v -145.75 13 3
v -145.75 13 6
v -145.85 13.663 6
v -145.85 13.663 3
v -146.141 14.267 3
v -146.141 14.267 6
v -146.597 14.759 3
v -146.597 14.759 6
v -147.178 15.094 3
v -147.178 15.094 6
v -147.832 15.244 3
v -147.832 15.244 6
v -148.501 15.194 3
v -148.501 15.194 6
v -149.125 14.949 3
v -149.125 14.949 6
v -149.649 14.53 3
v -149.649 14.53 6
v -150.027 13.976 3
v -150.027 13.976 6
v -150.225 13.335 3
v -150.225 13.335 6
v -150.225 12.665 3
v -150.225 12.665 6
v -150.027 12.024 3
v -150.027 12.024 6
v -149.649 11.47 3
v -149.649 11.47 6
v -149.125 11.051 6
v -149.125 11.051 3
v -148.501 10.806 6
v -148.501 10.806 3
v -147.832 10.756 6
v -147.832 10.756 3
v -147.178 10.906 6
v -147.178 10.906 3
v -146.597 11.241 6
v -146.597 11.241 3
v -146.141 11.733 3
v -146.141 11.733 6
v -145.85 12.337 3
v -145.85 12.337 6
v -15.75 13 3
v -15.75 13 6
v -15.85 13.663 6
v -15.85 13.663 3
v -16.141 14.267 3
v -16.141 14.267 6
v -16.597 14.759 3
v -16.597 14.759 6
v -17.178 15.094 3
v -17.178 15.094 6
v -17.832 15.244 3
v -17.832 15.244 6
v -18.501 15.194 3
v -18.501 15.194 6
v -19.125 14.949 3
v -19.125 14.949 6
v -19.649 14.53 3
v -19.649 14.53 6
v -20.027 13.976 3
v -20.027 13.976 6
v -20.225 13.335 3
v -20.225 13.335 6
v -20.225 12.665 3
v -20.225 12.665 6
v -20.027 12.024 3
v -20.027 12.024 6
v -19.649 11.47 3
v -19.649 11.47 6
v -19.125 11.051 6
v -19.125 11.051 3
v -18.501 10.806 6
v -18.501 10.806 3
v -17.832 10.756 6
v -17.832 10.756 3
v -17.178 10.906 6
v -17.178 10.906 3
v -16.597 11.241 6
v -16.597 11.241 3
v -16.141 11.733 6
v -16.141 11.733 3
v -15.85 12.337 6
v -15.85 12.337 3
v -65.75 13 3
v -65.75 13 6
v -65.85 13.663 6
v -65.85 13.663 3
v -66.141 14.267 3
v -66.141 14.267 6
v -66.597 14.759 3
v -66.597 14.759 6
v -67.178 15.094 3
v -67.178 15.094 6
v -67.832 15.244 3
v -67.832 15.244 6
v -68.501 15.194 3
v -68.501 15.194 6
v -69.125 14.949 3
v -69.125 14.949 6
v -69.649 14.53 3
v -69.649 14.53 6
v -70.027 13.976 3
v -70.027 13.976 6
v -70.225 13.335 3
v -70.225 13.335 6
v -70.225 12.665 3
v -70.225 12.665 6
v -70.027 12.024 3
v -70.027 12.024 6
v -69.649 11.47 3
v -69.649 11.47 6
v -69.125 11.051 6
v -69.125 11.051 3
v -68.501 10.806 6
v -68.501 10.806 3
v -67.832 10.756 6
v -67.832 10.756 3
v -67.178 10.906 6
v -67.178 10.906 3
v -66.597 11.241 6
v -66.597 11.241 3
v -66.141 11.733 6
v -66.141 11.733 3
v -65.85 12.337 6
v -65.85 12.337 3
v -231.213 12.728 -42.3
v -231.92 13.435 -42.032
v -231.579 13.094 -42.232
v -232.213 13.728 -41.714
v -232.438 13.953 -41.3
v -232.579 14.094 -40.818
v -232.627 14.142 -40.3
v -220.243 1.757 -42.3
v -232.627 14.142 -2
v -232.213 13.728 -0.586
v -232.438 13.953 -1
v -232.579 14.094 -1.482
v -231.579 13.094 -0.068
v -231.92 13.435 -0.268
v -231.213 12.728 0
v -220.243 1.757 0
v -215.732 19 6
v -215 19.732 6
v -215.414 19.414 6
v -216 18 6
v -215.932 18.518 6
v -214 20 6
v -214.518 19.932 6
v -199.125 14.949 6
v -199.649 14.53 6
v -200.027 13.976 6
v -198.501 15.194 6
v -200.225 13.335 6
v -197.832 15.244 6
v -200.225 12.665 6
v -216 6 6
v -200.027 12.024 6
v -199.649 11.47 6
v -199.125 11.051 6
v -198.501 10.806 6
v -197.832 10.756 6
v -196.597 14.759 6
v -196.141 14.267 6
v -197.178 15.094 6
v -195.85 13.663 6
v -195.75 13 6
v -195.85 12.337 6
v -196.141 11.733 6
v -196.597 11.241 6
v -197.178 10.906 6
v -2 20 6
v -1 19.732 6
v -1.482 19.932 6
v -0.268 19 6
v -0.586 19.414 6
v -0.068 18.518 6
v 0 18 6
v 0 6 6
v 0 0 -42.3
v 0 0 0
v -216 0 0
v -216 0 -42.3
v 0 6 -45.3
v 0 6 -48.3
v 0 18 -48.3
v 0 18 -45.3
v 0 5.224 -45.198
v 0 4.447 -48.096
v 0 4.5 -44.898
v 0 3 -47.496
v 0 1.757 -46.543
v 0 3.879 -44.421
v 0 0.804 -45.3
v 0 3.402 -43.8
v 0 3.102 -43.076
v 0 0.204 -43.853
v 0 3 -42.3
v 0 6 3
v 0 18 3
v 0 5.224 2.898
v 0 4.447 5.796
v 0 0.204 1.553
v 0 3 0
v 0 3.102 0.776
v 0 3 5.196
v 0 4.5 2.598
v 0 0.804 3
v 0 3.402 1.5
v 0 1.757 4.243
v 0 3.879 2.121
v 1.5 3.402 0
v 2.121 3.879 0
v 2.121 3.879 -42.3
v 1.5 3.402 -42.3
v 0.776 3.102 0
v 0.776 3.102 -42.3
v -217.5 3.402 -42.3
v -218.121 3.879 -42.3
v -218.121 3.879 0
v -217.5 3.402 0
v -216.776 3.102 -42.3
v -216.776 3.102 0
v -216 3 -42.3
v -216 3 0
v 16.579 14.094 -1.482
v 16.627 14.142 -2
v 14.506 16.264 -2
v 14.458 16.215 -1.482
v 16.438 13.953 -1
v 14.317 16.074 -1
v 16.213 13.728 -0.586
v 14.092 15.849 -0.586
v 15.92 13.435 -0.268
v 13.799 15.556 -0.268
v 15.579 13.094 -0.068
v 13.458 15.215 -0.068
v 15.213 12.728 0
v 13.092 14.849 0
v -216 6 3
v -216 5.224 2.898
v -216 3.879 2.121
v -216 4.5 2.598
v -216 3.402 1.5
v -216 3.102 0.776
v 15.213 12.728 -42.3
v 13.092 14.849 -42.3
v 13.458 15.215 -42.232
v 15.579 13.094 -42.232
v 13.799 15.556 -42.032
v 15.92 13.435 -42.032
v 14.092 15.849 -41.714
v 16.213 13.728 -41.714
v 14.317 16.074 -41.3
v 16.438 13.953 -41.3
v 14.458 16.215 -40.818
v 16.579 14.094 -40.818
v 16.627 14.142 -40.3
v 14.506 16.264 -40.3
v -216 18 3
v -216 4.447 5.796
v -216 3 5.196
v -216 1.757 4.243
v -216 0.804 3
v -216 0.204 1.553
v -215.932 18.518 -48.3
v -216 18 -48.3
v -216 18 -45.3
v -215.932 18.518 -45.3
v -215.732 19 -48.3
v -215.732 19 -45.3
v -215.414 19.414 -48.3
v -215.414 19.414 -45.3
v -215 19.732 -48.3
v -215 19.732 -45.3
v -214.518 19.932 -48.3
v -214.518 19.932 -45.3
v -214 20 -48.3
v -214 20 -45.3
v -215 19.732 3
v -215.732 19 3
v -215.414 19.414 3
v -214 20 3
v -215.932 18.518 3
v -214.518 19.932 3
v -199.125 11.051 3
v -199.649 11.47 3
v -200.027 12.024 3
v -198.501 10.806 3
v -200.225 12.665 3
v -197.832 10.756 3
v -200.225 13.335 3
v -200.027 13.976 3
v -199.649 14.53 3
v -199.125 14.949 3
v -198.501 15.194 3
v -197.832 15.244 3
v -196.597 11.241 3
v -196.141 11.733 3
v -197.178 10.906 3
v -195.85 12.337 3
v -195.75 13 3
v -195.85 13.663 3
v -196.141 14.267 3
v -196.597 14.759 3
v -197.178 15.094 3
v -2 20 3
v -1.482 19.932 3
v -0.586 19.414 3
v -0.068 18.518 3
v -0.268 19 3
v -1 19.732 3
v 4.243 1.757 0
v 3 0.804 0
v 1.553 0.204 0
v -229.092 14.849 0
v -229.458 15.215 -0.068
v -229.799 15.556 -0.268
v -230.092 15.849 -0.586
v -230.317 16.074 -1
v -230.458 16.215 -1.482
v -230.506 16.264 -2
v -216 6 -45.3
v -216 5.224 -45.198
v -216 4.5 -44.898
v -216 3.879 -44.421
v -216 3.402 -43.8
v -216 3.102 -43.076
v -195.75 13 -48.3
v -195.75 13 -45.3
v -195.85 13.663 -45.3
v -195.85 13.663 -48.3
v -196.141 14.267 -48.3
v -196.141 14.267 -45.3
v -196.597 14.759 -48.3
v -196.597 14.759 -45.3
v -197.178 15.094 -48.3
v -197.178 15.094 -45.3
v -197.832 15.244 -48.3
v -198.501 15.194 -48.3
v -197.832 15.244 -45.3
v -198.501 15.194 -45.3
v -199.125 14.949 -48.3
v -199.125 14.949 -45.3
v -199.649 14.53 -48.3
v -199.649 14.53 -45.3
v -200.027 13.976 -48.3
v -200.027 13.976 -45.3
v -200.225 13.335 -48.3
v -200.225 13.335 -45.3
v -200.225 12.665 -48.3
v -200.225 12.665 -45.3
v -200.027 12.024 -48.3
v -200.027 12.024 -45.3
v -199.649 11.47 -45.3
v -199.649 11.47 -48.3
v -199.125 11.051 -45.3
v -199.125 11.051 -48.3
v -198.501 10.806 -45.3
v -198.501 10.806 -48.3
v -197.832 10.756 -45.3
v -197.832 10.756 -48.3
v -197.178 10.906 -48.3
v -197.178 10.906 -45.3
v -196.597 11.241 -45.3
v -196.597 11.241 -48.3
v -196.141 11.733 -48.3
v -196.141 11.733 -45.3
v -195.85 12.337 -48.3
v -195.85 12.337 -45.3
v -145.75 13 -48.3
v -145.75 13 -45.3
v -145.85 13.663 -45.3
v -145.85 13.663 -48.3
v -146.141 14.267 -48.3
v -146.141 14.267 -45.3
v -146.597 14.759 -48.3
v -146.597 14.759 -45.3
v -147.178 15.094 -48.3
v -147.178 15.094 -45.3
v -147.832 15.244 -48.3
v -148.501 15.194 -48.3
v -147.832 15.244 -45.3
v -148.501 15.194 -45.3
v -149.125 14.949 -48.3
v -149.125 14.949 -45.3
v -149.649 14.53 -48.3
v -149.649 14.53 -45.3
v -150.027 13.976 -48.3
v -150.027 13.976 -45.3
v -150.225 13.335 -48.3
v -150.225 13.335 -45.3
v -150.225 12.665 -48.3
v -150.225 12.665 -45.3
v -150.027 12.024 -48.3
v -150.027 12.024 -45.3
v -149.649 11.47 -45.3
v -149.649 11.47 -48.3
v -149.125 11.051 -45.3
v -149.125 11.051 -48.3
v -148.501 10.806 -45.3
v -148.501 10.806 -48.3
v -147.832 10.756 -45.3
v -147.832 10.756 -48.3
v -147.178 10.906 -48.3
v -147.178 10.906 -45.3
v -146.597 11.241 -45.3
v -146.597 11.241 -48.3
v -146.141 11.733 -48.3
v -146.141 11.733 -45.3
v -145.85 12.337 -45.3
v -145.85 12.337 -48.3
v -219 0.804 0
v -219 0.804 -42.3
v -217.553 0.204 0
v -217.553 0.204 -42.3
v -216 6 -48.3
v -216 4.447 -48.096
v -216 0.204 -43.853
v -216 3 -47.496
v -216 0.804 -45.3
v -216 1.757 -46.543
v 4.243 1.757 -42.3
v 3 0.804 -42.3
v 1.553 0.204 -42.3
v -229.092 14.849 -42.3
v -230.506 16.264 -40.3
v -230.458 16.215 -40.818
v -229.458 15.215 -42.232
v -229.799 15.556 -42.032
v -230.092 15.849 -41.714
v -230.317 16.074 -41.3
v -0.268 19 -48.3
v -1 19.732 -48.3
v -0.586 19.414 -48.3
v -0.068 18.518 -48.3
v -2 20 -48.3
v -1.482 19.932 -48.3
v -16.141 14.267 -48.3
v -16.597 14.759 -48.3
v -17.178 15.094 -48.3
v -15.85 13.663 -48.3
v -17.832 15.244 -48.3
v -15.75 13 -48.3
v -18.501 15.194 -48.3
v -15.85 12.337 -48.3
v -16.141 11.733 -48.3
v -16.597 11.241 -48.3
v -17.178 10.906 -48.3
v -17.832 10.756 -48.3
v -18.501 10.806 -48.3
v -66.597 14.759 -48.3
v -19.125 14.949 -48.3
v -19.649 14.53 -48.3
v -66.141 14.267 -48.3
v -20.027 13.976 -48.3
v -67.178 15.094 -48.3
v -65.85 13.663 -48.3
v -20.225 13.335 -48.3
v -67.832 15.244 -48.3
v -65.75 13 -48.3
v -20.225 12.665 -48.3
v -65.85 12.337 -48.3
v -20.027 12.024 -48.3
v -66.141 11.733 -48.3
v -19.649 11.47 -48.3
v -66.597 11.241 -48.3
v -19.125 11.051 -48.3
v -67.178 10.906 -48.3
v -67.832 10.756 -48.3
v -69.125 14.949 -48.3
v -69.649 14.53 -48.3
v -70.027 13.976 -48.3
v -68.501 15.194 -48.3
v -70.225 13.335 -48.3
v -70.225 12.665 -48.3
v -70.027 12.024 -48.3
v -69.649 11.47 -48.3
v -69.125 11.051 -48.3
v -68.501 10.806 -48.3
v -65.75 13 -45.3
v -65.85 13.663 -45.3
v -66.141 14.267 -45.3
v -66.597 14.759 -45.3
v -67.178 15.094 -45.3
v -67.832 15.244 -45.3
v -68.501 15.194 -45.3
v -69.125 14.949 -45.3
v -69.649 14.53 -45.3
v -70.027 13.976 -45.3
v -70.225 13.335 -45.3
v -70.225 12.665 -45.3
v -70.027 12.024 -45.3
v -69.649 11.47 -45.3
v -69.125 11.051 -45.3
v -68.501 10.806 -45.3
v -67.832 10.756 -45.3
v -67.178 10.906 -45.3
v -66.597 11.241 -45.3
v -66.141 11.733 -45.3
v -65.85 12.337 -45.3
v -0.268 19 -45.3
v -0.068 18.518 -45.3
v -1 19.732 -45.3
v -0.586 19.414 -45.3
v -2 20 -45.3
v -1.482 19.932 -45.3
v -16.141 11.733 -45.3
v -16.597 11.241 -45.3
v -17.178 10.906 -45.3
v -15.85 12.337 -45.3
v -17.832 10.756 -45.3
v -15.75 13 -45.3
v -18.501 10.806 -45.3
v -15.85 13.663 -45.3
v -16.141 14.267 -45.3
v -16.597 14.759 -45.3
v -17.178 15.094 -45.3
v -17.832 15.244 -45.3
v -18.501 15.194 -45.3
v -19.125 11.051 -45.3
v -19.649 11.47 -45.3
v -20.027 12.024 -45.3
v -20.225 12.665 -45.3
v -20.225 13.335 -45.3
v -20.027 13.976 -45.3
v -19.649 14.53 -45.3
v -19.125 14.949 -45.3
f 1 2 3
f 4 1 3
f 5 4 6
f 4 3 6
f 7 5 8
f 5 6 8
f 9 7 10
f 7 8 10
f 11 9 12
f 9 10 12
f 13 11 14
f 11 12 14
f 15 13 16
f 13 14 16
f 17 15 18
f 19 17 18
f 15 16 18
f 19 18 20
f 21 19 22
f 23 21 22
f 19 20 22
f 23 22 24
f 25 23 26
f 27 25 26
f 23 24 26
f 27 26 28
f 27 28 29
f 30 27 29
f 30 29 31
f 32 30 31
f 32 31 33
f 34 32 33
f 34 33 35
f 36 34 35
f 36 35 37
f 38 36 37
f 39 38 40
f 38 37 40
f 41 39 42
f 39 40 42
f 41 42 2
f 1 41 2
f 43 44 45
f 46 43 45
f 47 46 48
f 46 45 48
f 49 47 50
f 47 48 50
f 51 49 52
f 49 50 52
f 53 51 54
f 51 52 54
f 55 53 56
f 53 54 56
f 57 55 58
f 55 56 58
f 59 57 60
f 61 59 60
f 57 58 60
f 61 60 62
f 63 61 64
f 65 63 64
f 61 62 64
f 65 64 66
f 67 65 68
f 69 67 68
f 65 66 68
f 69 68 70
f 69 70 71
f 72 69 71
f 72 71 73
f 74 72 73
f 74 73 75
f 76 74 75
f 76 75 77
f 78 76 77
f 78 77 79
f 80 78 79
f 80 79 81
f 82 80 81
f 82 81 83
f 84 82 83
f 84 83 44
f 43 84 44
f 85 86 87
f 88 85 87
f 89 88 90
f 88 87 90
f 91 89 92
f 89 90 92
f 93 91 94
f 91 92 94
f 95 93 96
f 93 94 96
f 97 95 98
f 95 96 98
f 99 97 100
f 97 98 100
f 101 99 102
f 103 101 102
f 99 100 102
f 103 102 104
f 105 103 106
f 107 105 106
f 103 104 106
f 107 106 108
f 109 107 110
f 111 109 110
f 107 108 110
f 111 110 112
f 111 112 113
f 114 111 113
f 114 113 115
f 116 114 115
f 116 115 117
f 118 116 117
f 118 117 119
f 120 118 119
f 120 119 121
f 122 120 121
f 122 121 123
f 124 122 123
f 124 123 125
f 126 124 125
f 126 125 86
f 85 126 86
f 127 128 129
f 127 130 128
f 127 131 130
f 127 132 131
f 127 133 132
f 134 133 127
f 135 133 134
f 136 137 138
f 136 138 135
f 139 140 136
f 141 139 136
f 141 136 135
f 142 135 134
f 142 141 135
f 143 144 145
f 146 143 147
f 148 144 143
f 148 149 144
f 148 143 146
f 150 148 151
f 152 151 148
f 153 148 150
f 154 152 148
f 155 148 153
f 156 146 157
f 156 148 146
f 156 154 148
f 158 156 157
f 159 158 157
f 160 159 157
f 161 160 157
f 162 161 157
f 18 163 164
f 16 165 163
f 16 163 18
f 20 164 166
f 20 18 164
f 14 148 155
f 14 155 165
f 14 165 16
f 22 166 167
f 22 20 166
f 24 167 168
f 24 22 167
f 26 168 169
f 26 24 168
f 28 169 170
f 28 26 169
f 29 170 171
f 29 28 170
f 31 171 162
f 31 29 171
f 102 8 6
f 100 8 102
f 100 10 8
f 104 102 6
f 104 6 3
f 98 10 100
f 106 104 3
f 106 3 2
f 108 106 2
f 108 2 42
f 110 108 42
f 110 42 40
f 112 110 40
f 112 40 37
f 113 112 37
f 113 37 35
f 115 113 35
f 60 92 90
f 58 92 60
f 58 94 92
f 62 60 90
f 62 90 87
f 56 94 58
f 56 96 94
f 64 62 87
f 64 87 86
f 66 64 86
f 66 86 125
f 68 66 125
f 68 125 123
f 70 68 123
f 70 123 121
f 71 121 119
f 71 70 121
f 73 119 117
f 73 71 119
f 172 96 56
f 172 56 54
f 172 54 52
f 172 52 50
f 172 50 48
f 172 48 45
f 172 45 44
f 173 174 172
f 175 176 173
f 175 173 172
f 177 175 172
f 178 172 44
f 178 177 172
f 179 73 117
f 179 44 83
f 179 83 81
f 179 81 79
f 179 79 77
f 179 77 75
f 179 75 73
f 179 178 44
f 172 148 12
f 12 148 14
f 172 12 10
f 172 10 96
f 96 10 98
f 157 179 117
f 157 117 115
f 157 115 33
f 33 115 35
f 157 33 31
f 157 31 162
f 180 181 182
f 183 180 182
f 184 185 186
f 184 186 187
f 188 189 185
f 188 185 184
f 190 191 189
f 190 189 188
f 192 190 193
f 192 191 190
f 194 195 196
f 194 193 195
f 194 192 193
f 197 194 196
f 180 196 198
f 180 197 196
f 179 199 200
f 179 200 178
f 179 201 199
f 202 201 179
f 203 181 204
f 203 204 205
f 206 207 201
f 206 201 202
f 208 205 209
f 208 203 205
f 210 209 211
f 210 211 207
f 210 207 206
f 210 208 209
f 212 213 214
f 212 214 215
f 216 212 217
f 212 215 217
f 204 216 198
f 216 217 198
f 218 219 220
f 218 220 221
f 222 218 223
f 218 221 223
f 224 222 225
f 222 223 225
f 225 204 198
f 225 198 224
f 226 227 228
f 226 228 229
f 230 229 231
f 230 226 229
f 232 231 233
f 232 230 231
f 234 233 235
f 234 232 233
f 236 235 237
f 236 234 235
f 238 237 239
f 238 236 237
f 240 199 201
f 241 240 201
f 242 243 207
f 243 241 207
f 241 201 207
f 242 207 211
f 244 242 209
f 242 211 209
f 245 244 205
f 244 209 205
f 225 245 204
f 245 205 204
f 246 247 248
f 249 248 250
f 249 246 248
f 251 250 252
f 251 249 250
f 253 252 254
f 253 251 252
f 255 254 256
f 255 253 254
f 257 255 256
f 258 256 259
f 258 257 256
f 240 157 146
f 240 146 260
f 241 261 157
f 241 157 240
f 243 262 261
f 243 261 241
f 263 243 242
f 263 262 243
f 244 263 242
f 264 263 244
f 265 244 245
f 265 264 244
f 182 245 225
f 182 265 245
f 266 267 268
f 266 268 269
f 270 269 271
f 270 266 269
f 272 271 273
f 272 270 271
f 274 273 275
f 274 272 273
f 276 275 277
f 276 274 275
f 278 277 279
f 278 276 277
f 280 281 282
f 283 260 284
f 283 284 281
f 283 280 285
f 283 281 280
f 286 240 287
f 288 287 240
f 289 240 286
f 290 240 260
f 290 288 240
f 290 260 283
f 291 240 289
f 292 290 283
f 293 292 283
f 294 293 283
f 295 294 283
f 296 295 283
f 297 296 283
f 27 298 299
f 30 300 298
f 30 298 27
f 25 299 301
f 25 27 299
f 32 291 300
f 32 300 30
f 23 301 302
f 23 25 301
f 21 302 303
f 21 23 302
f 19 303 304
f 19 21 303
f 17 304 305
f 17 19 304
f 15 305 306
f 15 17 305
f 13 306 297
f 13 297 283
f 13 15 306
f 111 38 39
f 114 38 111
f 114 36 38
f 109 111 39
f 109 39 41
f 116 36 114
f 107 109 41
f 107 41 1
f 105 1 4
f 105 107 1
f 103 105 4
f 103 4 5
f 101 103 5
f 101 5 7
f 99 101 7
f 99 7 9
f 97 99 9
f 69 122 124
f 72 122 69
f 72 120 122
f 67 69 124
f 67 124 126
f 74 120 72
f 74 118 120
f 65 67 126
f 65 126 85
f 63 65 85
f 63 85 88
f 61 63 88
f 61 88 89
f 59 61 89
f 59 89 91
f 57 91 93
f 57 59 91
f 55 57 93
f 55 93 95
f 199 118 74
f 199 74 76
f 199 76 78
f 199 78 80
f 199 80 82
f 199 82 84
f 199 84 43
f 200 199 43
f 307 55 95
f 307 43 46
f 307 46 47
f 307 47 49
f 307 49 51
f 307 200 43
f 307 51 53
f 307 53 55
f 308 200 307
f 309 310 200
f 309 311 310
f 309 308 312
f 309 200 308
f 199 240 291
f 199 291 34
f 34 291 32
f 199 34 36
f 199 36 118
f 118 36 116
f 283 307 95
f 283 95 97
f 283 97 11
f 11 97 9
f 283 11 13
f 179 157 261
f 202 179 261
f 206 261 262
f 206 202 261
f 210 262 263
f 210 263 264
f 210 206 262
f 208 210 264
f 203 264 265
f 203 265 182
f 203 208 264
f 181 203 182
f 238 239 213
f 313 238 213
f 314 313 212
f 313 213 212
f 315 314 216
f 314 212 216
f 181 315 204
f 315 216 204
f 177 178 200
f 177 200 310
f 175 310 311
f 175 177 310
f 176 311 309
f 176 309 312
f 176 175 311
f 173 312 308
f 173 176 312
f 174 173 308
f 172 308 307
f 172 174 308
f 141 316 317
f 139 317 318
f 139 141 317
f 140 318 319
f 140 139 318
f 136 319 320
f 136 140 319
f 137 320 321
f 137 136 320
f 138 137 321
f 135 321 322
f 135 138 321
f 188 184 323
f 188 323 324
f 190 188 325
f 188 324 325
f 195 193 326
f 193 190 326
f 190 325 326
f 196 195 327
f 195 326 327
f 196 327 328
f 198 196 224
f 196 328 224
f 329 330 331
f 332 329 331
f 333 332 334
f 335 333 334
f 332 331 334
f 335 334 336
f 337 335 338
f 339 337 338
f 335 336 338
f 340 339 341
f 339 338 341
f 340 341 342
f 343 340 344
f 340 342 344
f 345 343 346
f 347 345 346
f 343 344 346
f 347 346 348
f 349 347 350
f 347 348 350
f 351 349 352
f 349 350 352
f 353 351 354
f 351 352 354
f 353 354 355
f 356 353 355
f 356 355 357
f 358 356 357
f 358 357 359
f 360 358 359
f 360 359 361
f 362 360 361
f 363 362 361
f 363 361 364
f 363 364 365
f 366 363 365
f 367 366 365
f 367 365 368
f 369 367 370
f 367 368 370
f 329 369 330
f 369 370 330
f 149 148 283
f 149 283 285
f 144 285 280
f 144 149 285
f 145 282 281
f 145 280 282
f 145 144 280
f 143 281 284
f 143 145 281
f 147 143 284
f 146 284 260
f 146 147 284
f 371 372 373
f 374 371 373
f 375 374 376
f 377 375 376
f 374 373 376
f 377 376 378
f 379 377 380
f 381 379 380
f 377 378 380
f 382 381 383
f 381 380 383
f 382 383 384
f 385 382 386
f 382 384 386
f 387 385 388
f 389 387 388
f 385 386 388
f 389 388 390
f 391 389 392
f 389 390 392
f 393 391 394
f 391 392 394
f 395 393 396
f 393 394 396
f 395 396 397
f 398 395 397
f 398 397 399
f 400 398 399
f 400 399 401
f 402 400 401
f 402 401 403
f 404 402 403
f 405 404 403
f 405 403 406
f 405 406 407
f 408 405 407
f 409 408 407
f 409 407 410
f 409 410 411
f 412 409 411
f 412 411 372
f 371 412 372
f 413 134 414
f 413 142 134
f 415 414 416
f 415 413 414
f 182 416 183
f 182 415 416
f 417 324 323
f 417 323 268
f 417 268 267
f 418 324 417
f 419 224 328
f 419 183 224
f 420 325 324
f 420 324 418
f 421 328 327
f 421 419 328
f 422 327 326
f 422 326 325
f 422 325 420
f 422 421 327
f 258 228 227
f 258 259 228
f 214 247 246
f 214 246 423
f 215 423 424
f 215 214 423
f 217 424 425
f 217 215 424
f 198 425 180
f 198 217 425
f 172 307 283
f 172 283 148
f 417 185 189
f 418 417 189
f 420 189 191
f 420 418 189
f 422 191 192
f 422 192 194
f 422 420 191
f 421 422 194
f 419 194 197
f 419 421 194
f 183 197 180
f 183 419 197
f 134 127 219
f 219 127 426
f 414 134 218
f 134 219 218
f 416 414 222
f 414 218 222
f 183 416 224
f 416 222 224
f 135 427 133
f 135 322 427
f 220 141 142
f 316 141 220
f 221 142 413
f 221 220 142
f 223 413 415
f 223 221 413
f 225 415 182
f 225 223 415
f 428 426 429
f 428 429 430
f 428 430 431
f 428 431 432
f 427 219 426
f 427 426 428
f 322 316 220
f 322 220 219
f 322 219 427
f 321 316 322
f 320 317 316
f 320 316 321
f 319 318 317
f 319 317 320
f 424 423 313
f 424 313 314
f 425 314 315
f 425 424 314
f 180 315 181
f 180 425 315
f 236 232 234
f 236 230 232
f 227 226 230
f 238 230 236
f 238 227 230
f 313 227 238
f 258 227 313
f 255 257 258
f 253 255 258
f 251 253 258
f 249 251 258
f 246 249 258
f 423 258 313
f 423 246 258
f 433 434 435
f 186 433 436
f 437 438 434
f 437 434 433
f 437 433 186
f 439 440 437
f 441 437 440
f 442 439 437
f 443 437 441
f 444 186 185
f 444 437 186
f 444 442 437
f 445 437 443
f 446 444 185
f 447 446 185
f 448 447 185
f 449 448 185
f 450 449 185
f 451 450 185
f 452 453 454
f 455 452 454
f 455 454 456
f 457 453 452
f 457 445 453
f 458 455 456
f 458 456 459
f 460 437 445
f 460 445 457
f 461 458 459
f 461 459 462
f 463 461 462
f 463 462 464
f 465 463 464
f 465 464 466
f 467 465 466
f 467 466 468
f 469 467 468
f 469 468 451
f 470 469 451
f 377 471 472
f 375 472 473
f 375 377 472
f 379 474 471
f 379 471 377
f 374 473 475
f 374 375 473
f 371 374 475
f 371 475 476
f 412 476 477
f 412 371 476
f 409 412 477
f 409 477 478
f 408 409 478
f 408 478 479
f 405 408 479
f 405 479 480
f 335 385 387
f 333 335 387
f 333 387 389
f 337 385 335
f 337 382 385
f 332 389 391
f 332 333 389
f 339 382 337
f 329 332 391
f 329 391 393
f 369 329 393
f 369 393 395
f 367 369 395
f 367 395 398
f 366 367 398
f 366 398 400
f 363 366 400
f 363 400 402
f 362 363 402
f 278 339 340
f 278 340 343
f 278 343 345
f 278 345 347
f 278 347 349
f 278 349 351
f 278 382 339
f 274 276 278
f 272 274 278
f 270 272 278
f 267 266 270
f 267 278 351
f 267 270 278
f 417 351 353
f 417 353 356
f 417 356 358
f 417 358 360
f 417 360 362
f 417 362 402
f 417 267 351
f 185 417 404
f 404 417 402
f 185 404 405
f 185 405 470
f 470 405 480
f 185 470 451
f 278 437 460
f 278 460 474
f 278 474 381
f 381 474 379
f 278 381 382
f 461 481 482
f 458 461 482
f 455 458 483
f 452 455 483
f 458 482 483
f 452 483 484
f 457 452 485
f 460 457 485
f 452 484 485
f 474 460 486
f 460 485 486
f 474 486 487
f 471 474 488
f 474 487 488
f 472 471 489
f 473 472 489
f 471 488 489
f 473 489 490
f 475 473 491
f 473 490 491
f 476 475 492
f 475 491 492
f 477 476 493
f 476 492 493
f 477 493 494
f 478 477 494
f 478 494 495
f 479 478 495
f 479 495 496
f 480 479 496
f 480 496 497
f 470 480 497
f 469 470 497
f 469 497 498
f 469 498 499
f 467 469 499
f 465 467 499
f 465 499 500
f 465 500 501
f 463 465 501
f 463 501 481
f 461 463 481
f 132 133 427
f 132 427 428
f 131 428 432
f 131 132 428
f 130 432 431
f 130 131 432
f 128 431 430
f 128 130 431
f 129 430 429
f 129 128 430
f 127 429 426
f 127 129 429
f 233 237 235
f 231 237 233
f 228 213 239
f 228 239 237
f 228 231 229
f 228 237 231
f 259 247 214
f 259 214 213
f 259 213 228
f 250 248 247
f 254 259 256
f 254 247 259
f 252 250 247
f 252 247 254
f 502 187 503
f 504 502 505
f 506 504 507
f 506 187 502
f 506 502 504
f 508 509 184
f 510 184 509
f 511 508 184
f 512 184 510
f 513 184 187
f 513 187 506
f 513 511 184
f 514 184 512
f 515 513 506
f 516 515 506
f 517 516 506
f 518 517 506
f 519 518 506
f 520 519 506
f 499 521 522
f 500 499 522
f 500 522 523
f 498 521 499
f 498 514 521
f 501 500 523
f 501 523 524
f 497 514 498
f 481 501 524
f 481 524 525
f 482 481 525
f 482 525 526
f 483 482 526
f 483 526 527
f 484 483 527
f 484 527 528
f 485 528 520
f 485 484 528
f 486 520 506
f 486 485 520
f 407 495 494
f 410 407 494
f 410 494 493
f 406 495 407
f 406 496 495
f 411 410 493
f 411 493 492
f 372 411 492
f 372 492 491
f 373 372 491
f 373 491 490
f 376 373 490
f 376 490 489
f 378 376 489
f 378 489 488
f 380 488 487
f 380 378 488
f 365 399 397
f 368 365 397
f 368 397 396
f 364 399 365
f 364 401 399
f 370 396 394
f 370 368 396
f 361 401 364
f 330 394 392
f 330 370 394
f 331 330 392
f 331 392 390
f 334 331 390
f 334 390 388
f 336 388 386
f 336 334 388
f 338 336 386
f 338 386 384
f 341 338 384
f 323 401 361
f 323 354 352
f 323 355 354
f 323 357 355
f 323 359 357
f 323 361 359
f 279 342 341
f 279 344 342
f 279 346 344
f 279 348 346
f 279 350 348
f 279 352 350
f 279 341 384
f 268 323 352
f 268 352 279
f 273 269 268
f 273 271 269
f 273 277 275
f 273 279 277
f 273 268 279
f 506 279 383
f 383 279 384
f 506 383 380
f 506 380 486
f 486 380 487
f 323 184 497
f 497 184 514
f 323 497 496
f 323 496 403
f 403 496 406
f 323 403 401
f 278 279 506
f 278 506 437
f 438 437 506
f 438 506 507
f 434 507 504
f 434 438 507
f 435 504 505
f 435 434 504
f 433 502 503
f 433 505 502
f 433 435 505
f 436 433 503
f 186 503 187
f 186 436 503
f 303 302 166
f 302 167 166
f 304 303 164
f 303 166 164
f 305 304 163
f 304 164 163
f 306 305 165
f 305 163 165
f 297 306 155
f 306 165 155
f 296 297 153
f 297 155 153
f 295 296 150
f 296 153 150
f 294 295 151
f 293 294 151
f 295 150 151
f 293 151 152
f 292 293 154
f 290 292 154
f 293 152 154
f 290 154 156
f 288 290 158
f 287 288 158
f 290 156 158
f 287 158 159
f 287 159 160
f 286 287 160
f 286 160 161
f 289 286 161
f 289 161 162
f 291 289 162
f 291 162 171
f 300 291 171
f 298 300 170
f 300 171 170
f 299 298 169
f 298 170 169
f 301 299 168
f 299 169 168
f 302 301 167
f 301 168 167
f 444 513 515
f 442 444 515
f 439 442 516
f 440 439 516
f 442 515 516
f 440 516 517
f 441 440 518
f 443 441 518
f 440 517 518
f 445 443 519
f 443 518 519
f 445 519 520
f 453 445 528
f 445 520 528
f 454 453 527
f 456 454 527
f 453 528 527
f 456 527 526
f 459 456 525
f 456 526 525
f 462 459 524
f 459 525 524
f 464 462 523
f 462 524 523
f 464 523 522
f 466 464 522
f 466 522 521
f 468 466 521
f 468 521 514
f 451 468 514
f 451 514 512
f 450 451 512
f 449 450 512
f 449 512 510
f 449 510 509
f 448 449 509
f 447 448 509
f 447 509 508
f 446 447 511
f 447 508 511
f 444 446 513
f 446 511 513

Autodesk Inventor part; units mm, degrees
ref_plane "YZ Plane" through (0, 0, 0) normal (1, 0, 0) x (0, 1, 0)
ref_plane "XZ Plane" through (0, 0, 0) normal (0, 1, 0) x (-1, 0, 0)
ref_plane "XY Plane" through (0, 0, 0) normal (0, 0, 1) x (1, 0, 0)
sketch "Skizze1" plane through (0, 0, 0) normal (0, 1, 0) x (-1, 0, 0)
  line L0 (0, 0) -> (216, 0)
  line L1 (216, 0) -> (216, -42.3)
  line L2 (216, -42.3) -> (0, -42.3)
  line L3 (0, -42.3) -> (0, 0)
  dimension "d0" = 216
  dimension "d1" = 42.3
extrude "Extrusion1" add sketch "Skizze1" along normal blind 3
sketch "Skizze2" plane through (0, 6, 3) normal (0, 0, 1) x (1, 0, 0)
  line L0 (-216, 0) -> (0, 0)
  line L1 (0, 0) -> (0, 14)
  line L2 (0, 14) -> (-216, 14)
  line L3 (-216, 14) -> (-216, 0)
edge flange "Lasche1" height 20 angle 90 thickness 3 bend radius 3 thickness toward (0, 0, 1) relief tear relief width 3 relief depth 1.5 corner gap 3 corner form 0 edges at (-108, 3, 0) (-108, 3, -42.3) wall of the first edge with corners at (-216, 6, 3) (0, 6, 3) (0, 20, 3) (-216, 20, 3)
bend "Biegung1"
corner "Ecke1"
sketch "Skizze3" plane through (-218.1213, 3.8787, 0) normal (-0.7071068, -0.7071068, 0) x (0.7071068, -0.7071068, 0)
  line L0 (0, -42.3) -> (0, 0)
  line L1 (0, 0) -> (-17.5147, 0)
  line L2 (-17.5147, 0) -> (-17.5147, -42.3)
  line L3 (-17.5147, -42.3) -> (0, -42.3)
edge flange "Lasche2" height 20 angle 45 thickness 3 bend radius 3 thickness toward (-0.7071068, -0.7071068, 0) relief tear relief width 3 relief depth 1.5 corner gap 3 corner form 0 edges at (-216, 3, -21.15) (0, 3, -21.15) wall of the first edge with corners at (-218.1213, 3.8787, -42.3) (-218.1213, 3.8787, 0) (-230.5061, 16.2635, 0) (-230.5061, 16.2635, -42.3)
bend "Biegung2"
corner "Ecke2"
sketch "Skizze4" plane through (-216, 20, 6) normal (0, 0, 1) x (1, 0, 0)
  line L0 (0, 0) -> (0, -14) projected
  line L1 (0, -7) -> (216, -7)
  line L2 (216, 0) -> (216, -14) projected
  line L3 (0, 0) -> (216, 0) projected
  line L4 (108, 0) -> (108, -14)
  line L5 (216, -14) -> (0, -14) projected
  circle A0 centre (68, -7) radius 2.25
  circle A1 centre (18, -7) radius 2.25
  circle A2 centre (148, -7) radius 2.25
  circle A3 centre (198, -7) radius 2.25
  point P0 (216, -20)
  dimension "d25" = 4.5
  dimension "d26" = 4.5
  dimension "d27" = 4.5
  dimension "d28" = 4.5
  dimension "d29" = 80
  dimension "d30" = 180
extrude "Extrusion2" cut sketch "Skizze4" against normal blind 100 contours A1 L1 | L1 A1 | A0 L1 | L1 A0 | A2 L1 | L1 A2 | A3 L1 | L1 A3
fillet "Rundung1" radius 2 8 edges at (-231.5668, 15.2028, 0) (-231.5668, 15.2028, -42.3) (-216, 20, -46.8) (-216, 20, 4.5) (0, 20, 4.5) (15.5668, 15.2028, 0) (0, 20, -46.8) (15.5668, 15.2028, -42.3)
equation "\"d4\" = Stärke"
equation "\"d5\" = BreiteBiegungsfreistellung"
equation "\"d6\" = TiefeBiegungsfreistellung"
equation "\"d7\" = MinimalRest"
equation "\"d8\" = Übergangsradius"
equation "\"d11\" = Biegeradius"
equation "\"d12\" = GrößeEckenfreistellung"
equation "\"d13\" = Abstandsgröße"
equation "\"d14\" = JacobiRadiusGröße"
equation "\"d15\" = BreiteBiegungsfreistellung"
equation "\"d16\" = TiefeBiegungsfreistellung"
equation "\"d17\" = MinimalRest"
equation "\"d18\" = Übergangsradius"
equation "\"d21\" = Biegeradius"
equation "\"d22\" = GrößeEckenfreistellung"
equation "\"d23\" = Abstandsgröße"
equation "\"d24\" = JacobiRadiusGröße"
equation "\"Biegeradius\" = Stärke"
equation "\"BreiteBiegungsfreistellung\" = Stärke"
equation "\"TiefeBiegungsfreistellung\" = 0.5 * Stärke"
equation "\"GrößeEckenfreistellung\" = 4 * Stärke"
equation "\"MinimalRest\" = 2 * Stärke"
equation "\"Übergangsradius\" = Biegeradius"
equation "\"JacobiRadiusGröße\" = Biegeradius"
equation "\"Abstandsgröße\" = Stärke"
equation "\"Stärke\" = 3"
properties part number "Stossfänger_04" material "Aluminium 6061"
